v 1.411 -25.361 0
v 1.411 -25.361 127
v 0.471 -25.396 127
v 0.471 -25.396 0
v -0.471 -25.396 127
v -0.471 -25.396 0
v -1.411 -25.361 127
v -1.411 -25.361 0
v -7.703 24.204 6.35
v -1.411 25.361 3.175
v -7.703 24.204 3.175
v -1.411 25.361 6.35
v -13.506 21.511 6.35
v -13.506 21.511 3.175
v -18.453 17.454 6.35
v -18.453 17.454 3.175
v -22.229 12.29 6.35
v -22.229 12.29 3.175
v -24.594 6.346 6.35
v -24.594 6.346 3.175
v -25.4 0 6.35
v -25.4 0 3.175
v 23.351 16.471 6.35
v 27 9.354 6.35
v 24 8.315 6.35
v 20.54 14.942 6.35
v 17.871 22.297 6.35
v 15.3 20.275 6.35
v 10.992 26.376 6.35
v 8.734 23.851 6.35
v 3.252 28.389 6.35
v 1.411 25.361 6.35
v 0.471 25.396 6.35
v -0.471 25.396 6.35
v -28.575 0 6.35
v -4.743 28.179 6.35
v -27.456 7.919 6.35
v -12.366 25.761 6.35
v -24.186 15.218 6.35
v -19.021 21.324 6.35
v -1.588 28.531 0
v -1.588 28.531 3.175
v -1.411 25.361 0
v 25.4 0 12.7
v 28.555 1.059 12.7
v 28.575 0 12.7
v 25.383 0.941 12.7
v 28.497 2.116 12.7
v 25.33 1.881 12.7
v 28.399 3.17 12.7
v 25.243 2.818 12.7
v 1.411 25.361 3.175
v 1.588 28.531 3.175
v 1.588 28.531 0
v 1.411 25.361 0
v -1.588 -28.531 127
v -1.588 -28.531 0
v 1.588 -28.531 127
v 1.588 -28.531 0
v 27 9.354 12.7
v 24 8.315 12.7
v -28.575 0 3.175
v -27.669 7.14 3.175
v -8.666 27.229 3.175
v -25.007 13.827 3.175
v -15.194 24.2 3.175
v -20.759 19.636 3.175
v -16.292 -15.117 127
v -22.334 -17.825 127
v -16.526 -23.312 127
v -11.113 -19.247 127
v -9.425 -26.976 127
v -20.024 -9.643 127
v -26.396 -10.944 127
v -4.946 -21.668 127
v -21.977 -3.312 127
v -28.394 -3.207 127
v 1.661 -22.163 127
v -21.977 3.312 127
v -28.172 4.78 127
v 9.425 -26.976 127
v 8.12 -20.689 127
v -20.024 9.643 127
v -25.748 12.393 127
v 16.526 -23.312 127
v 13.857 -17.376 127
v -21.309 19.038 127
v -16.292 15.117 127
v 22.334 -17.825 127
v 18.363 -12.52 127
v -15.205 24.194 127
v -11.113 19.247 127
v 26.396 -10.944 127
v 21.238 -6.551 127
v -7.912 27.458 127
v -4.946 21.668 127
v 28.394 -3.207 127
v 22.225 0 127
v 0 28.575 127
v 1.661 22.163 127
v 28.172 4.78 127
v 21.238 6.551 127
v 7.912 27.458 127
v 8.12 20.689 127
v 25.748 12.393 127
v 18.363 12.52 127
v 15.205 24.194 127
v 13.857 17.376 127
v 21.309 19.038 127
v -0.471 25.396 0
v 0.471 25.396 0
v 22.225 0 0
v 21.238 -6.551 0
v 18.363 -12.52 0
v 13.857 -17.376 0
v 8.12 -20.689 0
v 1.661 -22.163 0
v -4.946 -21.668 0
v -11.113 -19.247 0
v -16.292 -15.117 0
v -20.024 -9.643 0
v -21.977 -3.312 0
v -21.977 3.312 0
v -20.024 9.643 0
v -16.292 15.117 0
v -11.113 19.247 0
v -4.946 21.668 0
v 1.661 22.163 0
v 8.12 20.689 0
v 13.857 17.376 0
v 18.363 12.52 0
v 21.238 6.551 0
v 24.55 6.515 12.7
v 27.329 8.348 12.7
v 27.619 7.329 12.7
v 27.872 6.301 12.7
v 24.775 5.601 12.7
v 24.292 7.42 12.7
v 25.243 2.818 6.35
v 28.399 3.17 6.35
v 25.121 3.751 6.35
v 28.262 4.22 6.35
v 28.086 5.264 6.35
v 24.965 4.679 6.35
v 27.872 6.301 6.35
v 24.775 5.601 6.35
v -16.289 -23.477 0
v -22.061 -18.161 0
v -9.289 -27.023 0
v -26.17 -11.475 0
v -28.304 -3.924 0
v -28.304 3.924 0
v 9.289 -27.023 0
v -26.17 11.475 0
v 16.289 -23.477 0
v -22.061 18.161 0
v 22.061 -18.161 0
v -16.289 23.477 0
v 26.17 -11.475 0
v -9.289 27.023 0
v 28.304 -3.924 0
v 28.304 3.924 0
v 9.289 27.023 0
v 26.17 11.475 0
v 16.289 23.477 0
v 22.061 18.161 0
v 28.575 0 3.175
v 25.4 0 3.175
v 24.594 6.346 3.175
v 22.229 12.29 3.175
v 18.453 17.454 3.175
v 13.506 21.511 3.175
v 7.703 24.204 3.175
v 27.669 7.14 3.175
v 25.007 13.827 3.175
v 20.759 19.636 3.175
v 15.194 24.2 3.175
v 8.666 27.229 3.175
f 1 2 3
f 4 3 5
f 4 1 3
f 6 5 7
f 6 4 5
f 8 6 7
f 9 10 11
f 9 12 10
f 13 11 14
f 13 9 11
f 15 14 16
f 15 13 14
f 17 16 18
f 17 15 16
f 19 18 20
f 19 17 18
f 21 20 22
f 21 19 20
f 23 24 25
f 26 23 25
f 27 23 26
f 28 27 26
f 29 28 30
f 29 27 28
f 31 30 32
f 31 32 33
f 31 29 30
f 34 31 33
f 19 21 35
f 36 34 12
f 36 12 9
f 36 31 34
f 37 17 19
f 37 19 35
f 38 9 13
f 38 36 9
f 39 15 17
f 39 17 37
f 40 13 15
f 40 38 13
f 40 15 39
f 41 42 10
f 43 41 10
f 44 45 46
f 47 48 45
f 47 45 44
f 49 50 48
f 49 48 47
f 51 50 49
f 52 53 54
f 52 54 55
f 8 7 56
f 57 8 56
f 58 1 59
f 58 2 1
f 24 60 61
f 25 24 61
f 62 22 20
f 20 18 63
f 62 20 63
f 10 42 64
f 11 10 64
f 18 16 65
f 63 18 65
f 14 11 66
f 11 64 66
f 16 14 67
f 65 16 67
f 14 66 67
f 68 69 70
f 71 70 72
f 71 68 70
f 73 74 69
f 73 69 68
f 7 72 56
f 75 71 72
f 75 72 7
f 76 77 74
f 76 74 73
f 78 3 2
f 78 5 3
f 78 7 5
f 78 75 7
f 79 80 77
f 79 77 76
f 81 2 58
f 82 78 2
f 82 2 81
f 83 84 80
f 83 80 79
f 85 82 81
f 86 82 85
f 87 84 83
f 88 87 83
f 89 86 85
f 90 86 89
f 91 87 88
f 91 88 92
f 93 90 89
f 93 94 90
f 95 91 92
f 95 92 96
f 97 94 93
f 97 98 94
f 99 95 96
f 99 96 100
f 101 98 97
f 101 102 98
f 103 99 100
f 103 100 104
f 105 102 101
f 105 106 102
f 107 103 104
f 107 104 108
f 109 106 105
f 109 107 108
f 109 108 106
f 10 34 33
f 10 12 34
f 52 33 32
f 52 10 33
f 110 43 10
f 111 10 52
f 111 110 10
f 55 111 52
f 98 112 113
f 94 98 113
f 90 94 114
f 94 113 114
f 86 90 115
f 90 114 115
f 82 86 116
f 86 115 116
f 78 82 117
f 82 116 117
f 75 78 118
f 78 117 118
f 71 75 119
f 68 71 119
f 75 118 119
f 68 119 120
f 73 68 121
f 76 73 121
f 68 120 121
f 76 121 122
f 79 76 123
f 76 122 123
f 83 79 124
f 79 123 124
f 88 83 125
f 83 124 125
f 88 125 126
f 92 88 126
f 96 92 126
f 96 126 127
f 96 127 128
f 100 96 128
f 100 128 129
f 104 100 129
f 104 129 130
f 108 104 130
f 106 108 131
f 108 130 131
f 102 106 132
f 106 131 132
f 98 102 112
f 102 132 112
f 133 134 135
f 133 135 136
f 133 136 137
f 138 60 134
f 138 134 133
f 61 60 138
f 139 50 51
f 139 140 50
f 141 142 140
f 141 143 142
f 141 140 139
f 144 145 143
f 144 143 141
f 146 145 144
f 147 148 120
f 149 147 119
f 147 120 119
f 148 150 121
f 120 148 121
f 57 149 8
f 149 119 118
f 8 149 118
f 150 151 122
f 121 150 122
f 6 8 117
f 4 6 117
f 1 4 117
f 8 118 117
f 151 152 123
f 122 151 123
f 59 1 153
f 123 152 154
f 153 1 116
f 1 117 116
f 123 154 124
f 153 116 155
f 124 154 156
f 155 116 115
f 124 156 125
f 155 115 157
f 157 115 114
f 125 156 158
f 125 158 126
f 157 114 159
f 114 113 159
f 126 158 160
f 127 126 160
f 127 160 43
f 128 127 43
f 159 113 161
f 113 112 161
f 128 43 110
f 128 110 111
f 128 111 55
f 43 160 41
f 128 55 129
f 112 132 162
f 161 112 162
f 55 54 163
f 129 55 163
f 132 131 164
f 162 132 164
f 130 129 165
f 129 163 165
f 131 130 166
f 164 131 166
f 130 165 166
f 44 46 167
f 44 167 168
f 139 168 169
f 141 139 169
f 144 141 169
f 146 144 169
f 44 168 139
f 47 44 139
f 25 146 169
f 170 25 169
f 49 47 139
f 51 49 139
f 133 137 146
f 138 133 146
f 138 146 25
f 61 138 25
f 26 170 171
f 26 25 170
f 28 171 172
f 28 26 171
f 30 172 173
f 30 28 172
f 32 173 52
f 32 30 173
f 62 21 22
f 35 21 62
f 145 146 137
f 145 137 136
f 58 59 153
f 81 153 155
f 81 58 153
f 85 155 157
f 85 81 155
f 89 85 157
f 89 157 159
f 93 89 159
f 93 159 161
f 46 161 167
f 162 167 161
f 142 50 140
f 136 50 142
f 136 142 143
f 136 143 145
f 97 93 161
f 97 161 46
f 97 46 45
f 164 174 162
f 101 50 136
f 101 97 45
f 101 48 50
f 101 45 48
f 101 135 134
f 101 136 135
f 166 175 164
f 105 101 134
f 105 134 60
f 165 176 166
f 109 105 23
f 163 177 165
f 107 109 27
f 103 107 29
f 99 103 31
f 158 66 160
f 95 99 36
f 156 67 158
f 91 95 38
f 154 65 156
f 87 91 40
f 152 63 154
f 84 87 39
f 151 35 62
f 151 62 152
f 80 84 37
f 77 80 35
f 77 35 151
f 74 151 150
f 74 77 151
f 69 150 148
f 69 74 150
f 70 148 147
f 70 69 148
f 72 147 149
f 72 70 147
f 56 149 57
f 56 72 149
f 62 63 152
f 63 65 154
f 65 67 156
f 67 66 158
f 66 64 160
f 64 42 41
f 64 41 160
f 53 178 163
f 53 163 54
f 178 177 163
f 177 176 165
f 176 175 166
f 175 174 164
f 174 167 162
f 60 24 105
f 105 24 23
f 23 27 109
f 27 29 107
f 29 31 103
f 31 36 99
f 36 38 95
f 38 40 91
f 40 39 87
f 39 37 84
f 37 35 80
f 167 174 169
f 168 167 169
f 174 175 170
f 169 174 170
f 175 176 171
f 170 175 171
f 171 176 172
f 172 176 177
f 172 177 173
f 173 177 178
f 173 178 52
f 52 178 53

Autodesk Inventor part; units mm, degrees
ref_plane "YZ Plane" through (0, 0, 0) normal (1, 0, 0) x (0, 1, 0)
ref_plane "XZ Plane" through (0, 0, 0) normal (0, 1, 0) x (-1, 0, 0)
ref_plane "XY Plane" through (0, 0, 0) normal (0, 0, 1) x (1, 0, 0)
sketch "Sketch1" plane through (0, 0, 0) normal (0, 0, 1) x (1, 0, 0)
  circle A0 centre (0, 0) radius 25.4
  circle A1 centre (0, 0) radius 22.225
  line L0 (0, 0) -> (0, 25.4)
  line L1 (0, 0) -> (19.2474, -11.1125)
  line L2 (0, 0) -> (-19.2474, -11.1125)
  line L3 (-19.2474, -11.1125) -> (-21.997, -12.7)
  line L4 (19.2474, -11.1125) -> (21.997, -12.7)
  arc A2 (9.6237, 23.5063) -> (-9.6237, 23.5063) centre (0, 0) ccw
  arc A3 (2.54, 25.2727) -> (-2.54, 25.2727) centre (0, 0) ccw
  arc A4 (21.2995, -13.8381) -> (22.9699, -10.8419) centre (0, 0) ccw
  arc A5 (20.5909, -14.872) -> (23.1385, -10.477) centre (0, 0) ccw
  dimension "d0" = 50.8
  dimension "d1" = 44.45
  dimension "d2" = 120
  dimension "d3" = 120
  dimension "d5" = 25.4
extrude "Extrusion1" add sketch "Sketch1" along normal blind 127 contours A0 L4 A1 L0 | L0 A1 L3 A0 | A0 L3 A1 L4
sketch "Sketch9" plane through (0, 0, 127) normal (0, 0, 1) x (1, 0, 0)
  circle A0 centre (0, 0) radius 28.575
  circle A1 centre (0, 0) radius 25.4
  circle A2 centre (0, 0) radius 25.4 projected
  arc A3 (1.4111, 25.3608) -> (-1.4111, 25.3608) centre (0, 0) ccw
  line L0 (1.5875, 28.5309) -> (1.4111, 25.3608)
  line L1 (-1.4111, -25.3608) -> (-1.5875, -28.5309)
  line L2 (-1.5875, 28.5309) -> (-1.4111, 25.3608)
  line L3 (1.4111, -25.3608) -> (1.5875, -28.5309)
  point P0 (-1.4111, 25.3608)
  dimension "d62" = 57.15
extrude "Extrusion7" add sketch "Sketch9" against normal blind 127 contours A0 L3 A1 L0 | L2 A1 L1 A0
extrude "Extrusion8" add sketch "Sketch9" against normal blind 120.65 contours L0 A1 L2 A0
ref_plane "Work Plane7" through (0, 0, 6.35) normal (0, 0, -1) x (-1, 0, 0)
sketch "Sketch10" plane through (0, 0, 6.35) normal (0, 0, -1) x (-1, 0, 0)
  circle A0 centre (0, 0) radius 25.4
  circle A1 centre (0, 0) radius 28.575
  line L0 (1.4111, -25.3608) -> (1.5875, -28.5309) projected
  line L1 (0, 0) -> (28.575, 0)
  arc A2 (1.5875, -28.5309) -> (1.5875, 28.5309) centre (0, 0) ccw projected
  line L2 (0, 0) -> (-28.575, 0)
  arc A3 (1.5875, -28.5309) -> (-1.5875, -28.5309) centre (0, 0) ccw projected
  line L3 (1.5875, 28.5309) -> (0, 0)
  line L4 (0, 0) -> (-1.5875, 28.5309)
  point P0 (25.4, 0)
  point P1 (-25.4, 0)
  point P2 (1.4111, 25.3608)
  point P3 (-1.4111, 25.3608)
extrude "Extrusion10" cut sketch "Sketch10" along normal blind 3.175 contours A0 L3 A1 L1 | L2 A1 L4 A0
sketch "Sketch11" plane through (0, 0, 6.35) normal (0, 0, -1) x (-1, 0, 0)
  line L0 (-28.575, 0) -> (-25.4, 0) projected
  line L1 (0, 0) -> (-28.575, 0)
  line L2 (-28.575, 0) -> (0, 0)
  arc A0 (28.575, 0) -> (-28.575, 0) centre (0, 0) ccw projected
  line L3 (-28.575, 0) -> (-28.3986, 3.1701)
  arc A1 (-1.5875, 28.5309) -> (-1.5875, -28.5309) centre (0, 0) ccw projected
  line L4 (-28.3986, 3.1701) -> (0, 0)
  line L5 (-28.3986, 3.1701) -> (-27.8716, 6.3011)
  line L6 (-27.8716, 6.3011) -> (-27.0005, 9.3542)
  line L7 (0, 0) -> (-27.8716, 6.3011)
  line L8 (-27.0005, 9.3542) -> (0, 0)
  arc A2 (-1.4111, -25.3608) -> (1.4111, -25.3608) centre (0, 0) ccw projected
  circle A3 centre (0, 0) radius 25.4
  point P0 (-24.7748, 5.6009)
  point P1 (-24.0005, 8.3149)
  point P2 (-25.2432, 2.8179)
  dimension "d77" = 3.175
  dimension "d78" = 3.175
  dimension "d79" = 3.175
extrude "Extrusion11" cut sketch "Sketch11" against normal blind 6.35 contours L3 L4 A3 L0 | A0 L3 | A0 L6 | L6 L8 A3 L7
properties part number "Maze"
